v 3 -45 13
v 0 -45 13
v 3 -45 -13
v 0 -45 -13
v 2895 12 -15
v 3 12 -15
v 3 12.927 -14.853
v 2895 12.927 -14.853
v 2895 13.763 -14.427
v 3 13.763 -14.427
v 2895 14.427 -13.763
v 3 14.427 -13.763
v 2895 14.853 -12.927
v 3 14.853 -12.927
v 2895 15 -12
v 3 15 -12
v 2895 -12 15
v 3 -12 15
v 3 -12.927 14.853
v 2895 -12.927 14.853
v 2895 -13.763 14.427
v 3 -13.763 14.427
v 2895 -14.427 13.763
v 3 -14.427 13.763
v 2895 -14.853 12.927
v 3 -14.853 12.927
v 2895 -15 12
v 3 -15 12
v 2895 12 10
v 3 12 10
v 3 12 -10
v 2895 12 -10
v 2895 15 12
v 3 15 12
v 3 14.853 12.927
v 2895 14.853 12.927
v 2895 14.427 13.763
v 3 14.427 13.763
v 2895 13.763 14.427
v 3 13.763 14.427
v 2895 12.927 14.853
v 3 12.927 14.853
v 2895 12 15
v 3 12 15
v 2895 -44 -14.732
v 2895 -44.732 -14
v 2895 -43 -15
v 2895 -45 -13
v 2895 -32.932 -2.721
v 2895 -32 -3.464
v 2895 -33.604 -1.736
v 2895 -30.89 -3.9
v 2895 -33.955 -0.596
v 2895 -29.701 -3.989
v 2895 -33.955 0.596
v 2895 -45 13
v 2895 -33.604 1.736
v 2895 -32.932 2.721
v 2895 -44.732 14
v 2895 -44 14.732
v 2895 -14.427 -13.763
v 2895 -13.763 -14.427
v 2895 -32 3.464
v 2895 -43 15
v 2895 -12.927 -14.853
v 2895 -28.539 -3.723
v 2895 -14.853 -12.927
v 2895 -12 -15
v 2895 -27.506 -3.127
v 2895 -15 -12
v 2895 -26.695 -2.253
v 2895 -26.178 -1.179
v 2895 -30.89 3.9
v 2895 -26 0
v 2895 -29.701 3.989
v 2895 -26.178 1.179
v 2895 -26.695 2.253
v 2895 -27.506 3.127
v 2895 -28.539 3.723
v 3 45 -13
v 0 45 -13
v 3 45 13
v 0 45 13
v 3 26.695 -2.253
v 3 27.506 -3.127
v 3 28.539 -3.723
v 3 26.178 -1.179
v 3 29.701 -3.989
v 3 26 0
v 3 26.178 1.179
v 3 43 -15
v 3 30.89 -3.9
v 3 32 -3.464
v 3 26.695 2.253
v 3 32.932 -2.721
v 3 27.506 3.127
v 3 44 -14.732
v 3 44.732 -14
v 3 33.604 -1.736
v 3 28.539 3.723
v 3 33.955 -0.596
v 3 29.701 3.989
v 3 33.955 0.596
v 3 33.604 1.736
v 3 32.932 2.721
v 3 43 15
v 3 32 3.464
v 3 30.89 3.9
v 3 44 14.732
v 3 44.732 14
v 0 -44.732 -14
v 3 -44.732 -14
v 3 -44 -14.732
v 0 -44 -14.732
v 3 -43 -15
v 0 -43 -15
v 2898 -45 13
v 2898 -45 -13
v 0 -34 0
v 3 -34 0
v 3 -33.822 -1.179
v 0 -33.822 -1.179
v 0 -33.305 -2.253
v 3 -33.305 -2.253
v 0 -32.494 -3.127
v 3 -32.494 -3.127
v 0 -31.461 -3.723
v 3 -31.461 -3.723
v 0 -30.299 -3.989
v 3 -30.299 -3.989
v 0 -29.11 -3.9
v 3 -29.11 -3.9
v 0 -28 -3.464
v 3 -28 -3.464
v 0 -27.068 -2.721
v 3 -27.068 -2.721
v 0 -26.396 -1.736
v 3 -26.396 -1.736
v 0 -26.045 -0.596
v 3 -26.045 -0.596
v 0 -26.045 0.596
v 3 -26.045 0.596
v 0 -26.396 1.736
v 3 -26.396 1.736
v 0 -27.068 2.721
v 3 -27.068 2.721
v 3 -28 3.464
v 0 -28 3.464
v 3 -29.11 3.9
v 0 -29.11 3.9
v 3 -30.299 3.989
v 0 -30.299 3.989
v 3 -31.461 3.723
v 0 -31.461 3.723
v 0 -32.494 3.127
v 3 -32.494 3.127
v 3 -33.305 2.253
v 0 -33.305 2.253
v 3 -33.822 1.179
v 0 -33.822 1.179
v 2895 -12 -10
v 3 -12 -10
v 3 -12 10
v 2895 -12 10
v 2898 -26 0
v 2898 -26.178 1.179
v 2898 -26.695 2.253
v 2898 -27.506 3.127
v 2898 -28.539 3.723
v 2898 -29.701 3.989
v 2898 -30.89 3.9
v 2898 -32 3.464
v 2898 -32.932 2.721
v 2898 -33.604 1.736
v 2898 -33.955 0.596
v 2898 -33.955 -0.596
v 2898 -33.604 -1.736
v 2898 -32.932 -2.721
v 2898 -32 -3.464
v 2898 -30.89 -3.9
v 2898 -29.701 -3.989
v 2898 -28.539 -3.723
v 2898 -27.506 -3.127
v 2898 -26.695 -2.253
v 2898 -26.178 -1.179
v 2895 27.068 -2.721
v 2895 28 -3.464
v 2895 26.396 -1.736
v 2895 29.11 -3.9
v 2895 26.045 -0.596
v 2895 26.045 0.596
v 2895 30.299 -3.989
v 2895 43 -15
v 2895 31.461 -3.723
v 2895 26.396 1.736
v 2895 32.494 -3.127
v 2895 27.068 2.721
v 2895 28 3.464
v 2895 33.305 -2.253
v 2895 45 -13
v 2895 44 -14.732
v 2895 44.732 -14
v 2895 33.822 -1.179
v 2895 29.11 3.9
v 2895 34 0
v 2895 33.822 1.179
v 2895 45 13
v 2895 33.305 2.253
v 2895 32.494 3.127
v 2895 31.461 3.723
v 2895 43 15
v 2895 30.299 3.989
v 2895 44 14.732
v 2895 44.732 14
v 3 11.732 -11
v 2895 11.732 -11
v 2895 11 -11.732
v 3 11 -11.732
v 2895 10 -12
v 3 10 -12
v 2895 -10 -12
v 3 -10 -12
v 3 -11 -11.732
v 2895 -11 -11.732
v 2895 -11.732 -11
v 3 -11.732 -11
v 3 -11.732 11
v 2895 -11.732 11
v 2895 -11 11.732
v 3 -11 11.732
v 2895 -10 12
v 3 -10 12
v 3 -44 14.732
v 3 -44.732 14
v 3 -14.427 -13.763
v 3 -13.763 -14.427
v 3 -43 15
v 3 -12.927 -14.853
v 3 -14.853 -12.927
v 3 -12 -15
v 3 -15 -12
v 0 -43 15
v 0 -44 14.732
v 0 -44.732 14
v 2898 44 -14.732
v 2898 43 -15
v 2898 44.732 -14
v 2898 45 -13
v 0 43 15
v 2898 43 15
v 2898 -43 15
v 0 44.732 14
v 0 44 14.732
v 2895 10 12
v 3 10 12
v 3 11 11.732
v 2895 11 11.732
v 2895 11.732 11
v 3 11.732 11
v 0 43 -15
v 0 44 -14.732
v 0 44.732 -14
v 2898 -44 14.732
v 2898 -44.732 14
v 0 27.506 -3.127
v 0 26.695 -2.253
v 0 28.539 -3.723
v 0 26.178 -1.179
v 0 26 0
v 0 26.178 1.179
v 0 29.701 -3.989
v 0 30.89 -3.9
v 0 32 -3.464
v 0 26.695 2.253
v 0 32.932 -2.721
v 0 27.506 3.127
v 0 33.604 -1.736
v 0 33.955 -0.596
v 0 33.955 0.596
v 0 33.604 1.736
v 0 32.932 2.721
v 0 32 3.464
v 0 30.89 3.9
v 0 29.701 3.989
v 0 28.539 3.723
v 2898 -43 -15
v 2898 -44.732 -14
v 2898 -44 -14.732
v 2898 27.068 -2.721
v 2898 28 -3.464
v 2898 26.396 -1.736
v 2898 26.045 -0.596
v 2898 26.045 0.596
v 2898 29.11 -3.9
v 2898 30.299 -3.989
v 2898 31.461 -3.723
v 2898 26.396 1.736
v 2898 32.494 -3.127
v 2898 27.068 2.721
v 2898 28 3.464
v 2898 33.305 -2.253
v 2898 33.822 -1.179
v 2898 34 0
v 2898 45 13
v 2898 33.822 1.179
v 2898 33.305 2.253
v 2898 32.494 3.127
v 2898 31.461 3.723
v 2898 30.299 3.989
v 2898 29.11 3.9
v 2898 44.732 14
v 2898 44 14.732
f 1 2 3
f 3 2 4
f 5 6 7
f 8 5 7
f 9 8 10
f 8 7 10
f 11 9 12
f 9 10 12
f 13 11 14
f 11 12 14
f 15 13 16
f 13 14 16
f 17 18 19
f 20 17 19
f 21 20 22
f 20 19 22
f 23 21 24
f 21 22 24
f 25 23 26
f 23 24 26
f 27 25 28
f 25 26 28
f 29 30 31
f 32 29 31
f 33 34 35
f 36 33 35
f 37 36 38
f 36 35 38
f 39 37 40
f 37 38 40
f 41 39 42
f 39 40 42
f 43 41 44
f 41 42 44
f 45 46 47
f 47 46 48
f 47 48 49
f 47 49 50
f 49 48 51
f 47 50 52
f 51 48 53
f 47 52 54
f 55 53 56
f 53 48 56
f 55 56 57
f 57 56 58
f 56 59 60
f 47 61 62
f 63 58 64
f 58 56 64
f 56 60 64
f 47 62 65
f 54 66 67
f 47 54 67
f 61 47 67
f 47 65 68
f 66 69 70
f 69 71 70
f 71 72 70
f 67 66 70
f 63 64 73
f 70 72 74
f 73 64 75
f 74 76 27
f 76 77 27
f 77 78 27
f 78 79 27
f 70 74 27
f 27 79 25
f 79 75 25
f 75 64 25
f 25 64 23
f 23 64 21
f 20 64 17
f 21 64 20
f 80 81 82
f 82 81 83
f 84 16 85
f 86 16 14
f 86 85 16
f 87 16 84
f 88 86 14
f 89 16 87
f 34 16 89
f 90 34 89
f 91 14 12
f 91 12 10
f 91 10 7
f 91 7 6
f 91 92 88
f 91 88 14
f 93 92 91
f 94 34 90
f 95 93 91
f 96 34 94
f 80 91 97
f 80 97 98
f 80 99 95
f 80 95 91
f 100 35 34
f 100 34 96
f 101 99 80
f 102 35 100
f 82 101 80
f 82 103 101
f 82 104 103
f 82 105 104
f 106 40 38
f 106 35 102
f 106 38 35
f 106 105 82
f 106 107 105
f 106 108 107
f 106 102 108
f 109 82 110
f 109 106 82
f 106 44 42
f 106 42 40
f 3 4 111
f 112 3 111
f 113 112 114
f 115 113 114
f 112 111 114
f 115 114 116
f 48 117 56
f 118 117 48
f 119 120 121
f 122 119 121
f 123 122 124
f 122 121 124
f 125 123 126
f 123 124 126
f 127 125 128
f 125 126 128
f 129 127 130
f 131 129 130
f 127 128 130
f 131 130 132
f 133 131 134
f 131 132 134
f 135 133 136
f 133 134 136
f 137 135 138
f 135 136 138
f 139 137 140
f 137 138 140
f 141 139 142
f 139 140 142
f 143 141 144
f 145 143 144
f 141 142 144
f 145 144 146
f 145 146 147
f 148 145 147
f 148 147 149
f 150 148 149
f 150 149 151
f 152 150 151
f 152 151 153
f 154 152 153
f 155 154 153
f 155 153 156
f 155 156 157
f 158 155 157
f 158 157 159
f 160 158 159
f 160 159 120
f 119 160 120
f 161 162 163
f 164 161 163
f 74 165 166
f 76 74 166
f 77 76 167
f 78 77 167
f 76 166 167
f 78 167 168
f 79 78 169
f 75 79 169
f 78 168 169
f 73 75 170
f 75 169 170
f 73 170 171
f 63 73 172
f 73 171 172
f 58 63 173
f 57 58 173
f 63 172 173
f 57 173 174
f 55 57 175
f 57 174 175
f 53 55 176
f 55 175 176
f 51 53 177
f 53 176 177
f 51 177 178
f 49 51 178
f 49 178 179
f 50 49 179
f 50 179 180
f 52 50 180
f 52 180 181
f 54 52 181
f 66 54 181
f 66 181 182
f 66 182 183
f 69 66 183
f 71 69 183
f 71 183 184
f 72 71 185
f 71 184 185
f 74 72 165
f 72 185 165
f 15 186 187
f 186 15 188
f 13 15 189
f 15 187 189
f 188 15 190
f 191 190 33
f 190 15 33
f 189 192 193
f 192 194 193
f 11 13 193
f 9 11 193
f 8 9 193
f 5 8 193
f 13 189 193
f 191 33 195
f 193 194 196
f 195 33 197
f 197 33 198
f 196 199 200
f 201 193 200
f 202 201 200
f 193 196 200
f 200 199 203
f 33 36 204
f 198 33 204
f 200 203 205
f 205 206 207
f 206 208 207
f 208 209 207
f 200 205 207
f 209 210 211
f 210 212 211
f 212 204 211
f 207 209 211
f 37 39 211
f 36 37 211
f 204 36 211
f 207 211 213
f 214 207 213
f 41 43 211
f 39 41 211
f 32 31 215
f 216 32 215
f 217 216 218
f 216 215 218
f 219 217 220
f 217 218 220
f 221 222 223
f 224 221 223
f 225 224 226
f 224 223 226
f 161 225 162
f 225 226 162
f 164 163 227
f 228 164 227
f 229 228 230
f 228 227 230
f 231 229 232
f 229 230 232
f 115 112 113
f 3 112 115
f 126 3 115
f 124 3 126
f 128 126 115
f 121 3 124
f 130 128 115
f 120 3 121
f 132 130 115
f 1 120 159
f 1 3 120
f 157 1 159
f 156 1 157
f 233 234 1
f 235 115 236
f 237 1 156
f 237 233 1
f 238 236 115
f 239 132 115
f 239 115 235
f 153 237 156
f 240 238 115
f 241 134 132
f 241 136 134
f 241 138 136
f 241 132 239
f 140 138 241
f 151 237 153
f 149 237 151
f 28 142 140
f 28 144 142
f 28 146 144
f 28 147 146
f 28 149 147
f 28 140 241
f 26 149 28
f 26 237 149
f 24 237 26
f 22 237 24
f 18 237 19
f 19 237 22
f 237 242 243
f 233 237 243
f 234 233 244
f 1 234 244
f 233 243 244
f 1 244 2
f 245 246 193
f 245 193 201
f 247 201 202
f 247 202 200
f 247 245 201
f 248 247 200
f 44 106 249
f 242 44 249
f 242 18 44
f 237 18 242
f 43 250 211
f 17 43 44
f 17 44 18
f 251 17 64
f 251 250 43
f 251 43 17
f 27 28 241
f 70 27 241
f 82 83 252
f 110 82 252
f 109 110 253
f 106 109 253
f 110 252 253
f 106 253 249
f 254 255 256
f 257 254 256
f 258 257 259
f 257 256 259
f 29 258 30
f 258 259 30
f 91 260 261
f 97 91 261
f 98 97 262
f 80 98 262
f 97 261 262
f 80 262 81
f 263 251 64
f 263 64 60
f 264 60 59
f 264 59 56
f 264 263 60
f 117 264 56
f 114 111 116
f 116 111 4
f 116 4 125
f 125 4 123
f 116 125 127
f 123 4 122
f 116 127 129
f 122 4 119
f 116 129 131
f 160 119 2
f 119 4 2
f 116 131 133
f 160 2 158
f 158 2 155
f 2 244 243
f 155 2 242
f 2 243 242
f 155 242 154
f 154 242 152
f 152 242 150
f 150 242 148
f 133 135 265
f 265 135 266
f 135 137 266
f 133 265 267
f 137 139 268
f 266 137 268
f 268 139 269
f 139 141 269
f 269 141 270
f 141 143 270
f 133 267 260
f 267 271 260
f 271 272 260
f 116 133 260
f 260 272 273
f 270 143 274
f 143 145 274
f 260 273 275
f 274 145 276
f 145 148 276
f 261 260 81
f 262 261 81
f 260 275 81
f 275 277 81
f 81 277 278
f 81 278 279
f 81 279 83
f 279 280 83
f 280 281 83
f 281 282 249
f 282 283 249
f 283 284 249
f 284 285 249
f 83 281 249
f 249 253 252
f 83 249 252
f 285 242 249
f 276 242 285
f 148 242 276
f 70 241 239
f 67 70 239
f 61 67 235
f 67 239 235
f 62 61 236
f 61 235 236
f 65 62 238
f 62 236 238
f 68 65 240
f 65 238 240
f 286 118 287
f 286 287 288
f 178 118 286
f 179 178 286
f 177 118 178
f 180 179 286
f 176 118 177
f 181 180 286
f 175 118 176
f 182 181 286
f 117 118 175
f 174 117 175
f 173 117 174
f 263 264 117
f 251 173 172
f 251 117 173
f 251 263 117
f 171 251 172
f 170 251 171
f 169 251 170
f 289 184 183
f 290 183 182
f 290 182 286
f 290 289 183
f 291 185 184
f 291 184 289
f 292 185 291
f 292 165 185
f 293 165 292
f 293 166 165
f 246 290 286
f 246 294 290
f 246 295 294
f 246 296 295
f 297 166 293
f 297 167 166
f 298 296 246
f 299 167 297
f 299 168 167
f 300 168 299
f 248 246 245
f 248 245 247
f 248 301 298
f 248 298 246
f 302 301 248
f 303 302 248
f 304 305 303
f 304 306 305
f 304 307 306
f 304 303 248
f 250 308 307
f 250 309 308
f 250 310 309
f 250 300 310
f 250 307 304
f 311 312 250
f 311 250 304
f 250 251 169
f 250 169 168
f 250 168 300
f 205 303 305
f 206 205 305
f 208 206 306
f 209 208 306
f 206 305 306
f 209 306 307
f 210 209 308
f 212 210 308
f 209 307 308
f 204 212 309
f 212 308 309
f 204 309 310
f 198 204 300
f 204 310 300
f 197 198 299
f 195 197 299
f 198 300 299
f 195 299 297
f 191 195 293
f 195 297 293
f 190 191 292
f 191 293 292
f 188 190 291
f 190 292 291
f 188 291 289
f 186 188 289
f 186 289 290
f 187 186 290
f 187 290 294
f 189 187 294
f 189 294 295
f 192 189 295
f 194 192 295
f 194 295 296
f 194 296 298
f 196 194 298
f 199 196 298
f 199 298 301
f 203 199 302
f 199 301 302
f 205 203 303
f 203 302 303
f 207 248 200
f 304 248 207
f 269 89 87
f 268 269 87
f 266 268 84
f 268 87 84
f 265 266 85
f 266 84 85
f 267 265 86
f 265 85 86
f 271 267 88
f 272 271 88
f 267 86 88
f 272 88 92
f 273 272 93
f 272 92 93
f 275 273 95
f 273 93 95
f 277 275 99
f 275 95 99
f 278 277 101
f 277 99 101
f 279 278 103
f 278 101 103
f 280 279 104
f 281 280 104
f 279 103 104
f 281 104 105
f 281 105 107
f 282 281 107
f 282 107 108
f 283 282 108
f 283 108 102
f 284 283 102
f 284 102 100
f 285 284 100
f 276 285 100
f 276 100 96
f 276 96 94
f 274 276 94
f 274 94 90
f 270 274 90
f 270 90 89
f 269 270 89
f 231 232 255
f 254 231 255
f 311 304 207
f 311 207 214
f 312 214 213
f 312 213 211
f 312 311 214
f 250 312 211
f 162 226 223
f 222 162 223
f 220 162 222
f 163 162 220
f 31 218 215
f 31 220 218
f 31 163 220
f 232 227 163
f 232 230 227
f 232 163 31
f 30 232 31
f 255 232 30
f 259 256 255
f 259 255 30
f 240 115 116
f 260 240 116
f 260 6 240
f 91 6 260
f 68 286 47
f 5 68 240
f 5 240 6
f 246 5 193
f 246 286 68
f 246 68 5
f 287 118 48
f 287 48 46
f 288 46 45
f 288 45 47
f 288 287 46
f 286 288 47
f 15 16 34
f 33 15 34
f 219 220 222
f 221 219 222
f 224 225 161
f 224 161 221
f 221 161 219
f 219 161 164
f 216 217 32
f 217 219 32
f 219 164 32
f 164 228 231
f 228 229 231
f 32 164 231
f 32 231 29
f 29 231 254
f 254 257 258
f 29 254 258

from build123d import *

# Parameters (mm, degrees)
F2_DEPTH = 2898
F4_DEPTH = 3
F5_D     = 8
F6_R     = 4
F7_DEPTH = 3


with BuildPart() as f2:
    # F0 (on Right) → F2 (new body, through all)
    with BuildSketch(Plane.YZ):
        with BuildLine():
            Line((-12, -15), (12, -15))
            ThreePointArc((12, -15), (14.12132, -14.12132), (15, -12))
            Line((15, -12), (15, 12))
            ThreePointArc((15, 12), (14.12132, 14.12132), (12, 15))
            Line((12, 15), (-12, 15))
            ThreePointArc((-12, 15), (-14.12132, 14.12132), (-15, 12))
            Line((-15, 12), (-15, -12))
            ThreePointArc((-15, -12), (-14.12132, -14.12132), (-12, -15))
        make_face()
        with BuildLine():
            ThreePointArc((12, -10), (11.414214, -11.414214), (10, -12))
            Line((10, -12), (-10, -12))
            ThreePointArc((-10, -12), (-11.414214, -11.414214), (-12, -10))
            Line((-12, -10), (-12, 10))
            ThreePointArc((-12, 10), (-11.414214, 11.414214), (-10, 12))
            Line((-10, 12), (10, 12))
            ThreePointArc((10, 12), (11.414214, 11.414214), (12, 10))
            Line((12, 10), (12, -10))
        make_face(mode=Mode.SUBTRACT)
    extrude(amount=F2_DEPTH)

    # F3 (on Right) → F4 (join)
    with BuildSketch(Plane.YZ):
        with BuildLine():
            ThreePointArc((45, 13), (44.414214, 14.414214), (43, 15))
            Line((43, 15), (-43, 15))
            ThreePointArc((-43, 15), (-44.414214, 14.414214), (-45, 13))
            Line((-45, 13), (-45, -13))
            ThreePointArc((-45, -13), (-44.414214, -14.414214), (-43, -15))
            Line((-43, -15), (43, -15))
            ThreePointArc((43, -15), (44.414214, -14.414214), (45, -13))
            Line((45, -13), (45, 13))
        make_face()
    extrude(amount=F4_DEPTH)

    # F5 (through all)
    with Locations(Plane(origin=(0, 0, 0), x_dir=(0, 1, 0), z_dir=(-1, 0, 0))):
        with Locations((30, 0), (-30, 0)):
            Hole(F5_D / 2)

    # F6 (on offset) → F7 (join)
    with BuildSketch(Plane.YZ.offset(2898)):
        with BuildLine():
            ThreePointArc((45, 13), (44.414214, 14.414214), (43, 15))
            Line((43, 15), (-43, 15))
            ThreePointArc((-43, 15), (-44.414214, 14.414214), (-45, 13))
            Line((-45, 13), (-45, -13))
            ThreePointArc((-45, -13), (-44.414214, -14.414214), (-43, -15))
            Line((-43, -15), (43, -15))
            ThreePointArc((43, -15), (44.414214, -14.414214), (45, -13))
            Line((45, -13), (45, 13))
        make_face()
        with Locations((-30, 0)):
            Circle(F6_R, mode=Mode.SUBTRACT)
        with Locations((30, 0)):
            Circle(F6_R, mode=Mode.SUBTRACT)
    extrude(amount=-F7_DEPTH)


solid = f2.part
